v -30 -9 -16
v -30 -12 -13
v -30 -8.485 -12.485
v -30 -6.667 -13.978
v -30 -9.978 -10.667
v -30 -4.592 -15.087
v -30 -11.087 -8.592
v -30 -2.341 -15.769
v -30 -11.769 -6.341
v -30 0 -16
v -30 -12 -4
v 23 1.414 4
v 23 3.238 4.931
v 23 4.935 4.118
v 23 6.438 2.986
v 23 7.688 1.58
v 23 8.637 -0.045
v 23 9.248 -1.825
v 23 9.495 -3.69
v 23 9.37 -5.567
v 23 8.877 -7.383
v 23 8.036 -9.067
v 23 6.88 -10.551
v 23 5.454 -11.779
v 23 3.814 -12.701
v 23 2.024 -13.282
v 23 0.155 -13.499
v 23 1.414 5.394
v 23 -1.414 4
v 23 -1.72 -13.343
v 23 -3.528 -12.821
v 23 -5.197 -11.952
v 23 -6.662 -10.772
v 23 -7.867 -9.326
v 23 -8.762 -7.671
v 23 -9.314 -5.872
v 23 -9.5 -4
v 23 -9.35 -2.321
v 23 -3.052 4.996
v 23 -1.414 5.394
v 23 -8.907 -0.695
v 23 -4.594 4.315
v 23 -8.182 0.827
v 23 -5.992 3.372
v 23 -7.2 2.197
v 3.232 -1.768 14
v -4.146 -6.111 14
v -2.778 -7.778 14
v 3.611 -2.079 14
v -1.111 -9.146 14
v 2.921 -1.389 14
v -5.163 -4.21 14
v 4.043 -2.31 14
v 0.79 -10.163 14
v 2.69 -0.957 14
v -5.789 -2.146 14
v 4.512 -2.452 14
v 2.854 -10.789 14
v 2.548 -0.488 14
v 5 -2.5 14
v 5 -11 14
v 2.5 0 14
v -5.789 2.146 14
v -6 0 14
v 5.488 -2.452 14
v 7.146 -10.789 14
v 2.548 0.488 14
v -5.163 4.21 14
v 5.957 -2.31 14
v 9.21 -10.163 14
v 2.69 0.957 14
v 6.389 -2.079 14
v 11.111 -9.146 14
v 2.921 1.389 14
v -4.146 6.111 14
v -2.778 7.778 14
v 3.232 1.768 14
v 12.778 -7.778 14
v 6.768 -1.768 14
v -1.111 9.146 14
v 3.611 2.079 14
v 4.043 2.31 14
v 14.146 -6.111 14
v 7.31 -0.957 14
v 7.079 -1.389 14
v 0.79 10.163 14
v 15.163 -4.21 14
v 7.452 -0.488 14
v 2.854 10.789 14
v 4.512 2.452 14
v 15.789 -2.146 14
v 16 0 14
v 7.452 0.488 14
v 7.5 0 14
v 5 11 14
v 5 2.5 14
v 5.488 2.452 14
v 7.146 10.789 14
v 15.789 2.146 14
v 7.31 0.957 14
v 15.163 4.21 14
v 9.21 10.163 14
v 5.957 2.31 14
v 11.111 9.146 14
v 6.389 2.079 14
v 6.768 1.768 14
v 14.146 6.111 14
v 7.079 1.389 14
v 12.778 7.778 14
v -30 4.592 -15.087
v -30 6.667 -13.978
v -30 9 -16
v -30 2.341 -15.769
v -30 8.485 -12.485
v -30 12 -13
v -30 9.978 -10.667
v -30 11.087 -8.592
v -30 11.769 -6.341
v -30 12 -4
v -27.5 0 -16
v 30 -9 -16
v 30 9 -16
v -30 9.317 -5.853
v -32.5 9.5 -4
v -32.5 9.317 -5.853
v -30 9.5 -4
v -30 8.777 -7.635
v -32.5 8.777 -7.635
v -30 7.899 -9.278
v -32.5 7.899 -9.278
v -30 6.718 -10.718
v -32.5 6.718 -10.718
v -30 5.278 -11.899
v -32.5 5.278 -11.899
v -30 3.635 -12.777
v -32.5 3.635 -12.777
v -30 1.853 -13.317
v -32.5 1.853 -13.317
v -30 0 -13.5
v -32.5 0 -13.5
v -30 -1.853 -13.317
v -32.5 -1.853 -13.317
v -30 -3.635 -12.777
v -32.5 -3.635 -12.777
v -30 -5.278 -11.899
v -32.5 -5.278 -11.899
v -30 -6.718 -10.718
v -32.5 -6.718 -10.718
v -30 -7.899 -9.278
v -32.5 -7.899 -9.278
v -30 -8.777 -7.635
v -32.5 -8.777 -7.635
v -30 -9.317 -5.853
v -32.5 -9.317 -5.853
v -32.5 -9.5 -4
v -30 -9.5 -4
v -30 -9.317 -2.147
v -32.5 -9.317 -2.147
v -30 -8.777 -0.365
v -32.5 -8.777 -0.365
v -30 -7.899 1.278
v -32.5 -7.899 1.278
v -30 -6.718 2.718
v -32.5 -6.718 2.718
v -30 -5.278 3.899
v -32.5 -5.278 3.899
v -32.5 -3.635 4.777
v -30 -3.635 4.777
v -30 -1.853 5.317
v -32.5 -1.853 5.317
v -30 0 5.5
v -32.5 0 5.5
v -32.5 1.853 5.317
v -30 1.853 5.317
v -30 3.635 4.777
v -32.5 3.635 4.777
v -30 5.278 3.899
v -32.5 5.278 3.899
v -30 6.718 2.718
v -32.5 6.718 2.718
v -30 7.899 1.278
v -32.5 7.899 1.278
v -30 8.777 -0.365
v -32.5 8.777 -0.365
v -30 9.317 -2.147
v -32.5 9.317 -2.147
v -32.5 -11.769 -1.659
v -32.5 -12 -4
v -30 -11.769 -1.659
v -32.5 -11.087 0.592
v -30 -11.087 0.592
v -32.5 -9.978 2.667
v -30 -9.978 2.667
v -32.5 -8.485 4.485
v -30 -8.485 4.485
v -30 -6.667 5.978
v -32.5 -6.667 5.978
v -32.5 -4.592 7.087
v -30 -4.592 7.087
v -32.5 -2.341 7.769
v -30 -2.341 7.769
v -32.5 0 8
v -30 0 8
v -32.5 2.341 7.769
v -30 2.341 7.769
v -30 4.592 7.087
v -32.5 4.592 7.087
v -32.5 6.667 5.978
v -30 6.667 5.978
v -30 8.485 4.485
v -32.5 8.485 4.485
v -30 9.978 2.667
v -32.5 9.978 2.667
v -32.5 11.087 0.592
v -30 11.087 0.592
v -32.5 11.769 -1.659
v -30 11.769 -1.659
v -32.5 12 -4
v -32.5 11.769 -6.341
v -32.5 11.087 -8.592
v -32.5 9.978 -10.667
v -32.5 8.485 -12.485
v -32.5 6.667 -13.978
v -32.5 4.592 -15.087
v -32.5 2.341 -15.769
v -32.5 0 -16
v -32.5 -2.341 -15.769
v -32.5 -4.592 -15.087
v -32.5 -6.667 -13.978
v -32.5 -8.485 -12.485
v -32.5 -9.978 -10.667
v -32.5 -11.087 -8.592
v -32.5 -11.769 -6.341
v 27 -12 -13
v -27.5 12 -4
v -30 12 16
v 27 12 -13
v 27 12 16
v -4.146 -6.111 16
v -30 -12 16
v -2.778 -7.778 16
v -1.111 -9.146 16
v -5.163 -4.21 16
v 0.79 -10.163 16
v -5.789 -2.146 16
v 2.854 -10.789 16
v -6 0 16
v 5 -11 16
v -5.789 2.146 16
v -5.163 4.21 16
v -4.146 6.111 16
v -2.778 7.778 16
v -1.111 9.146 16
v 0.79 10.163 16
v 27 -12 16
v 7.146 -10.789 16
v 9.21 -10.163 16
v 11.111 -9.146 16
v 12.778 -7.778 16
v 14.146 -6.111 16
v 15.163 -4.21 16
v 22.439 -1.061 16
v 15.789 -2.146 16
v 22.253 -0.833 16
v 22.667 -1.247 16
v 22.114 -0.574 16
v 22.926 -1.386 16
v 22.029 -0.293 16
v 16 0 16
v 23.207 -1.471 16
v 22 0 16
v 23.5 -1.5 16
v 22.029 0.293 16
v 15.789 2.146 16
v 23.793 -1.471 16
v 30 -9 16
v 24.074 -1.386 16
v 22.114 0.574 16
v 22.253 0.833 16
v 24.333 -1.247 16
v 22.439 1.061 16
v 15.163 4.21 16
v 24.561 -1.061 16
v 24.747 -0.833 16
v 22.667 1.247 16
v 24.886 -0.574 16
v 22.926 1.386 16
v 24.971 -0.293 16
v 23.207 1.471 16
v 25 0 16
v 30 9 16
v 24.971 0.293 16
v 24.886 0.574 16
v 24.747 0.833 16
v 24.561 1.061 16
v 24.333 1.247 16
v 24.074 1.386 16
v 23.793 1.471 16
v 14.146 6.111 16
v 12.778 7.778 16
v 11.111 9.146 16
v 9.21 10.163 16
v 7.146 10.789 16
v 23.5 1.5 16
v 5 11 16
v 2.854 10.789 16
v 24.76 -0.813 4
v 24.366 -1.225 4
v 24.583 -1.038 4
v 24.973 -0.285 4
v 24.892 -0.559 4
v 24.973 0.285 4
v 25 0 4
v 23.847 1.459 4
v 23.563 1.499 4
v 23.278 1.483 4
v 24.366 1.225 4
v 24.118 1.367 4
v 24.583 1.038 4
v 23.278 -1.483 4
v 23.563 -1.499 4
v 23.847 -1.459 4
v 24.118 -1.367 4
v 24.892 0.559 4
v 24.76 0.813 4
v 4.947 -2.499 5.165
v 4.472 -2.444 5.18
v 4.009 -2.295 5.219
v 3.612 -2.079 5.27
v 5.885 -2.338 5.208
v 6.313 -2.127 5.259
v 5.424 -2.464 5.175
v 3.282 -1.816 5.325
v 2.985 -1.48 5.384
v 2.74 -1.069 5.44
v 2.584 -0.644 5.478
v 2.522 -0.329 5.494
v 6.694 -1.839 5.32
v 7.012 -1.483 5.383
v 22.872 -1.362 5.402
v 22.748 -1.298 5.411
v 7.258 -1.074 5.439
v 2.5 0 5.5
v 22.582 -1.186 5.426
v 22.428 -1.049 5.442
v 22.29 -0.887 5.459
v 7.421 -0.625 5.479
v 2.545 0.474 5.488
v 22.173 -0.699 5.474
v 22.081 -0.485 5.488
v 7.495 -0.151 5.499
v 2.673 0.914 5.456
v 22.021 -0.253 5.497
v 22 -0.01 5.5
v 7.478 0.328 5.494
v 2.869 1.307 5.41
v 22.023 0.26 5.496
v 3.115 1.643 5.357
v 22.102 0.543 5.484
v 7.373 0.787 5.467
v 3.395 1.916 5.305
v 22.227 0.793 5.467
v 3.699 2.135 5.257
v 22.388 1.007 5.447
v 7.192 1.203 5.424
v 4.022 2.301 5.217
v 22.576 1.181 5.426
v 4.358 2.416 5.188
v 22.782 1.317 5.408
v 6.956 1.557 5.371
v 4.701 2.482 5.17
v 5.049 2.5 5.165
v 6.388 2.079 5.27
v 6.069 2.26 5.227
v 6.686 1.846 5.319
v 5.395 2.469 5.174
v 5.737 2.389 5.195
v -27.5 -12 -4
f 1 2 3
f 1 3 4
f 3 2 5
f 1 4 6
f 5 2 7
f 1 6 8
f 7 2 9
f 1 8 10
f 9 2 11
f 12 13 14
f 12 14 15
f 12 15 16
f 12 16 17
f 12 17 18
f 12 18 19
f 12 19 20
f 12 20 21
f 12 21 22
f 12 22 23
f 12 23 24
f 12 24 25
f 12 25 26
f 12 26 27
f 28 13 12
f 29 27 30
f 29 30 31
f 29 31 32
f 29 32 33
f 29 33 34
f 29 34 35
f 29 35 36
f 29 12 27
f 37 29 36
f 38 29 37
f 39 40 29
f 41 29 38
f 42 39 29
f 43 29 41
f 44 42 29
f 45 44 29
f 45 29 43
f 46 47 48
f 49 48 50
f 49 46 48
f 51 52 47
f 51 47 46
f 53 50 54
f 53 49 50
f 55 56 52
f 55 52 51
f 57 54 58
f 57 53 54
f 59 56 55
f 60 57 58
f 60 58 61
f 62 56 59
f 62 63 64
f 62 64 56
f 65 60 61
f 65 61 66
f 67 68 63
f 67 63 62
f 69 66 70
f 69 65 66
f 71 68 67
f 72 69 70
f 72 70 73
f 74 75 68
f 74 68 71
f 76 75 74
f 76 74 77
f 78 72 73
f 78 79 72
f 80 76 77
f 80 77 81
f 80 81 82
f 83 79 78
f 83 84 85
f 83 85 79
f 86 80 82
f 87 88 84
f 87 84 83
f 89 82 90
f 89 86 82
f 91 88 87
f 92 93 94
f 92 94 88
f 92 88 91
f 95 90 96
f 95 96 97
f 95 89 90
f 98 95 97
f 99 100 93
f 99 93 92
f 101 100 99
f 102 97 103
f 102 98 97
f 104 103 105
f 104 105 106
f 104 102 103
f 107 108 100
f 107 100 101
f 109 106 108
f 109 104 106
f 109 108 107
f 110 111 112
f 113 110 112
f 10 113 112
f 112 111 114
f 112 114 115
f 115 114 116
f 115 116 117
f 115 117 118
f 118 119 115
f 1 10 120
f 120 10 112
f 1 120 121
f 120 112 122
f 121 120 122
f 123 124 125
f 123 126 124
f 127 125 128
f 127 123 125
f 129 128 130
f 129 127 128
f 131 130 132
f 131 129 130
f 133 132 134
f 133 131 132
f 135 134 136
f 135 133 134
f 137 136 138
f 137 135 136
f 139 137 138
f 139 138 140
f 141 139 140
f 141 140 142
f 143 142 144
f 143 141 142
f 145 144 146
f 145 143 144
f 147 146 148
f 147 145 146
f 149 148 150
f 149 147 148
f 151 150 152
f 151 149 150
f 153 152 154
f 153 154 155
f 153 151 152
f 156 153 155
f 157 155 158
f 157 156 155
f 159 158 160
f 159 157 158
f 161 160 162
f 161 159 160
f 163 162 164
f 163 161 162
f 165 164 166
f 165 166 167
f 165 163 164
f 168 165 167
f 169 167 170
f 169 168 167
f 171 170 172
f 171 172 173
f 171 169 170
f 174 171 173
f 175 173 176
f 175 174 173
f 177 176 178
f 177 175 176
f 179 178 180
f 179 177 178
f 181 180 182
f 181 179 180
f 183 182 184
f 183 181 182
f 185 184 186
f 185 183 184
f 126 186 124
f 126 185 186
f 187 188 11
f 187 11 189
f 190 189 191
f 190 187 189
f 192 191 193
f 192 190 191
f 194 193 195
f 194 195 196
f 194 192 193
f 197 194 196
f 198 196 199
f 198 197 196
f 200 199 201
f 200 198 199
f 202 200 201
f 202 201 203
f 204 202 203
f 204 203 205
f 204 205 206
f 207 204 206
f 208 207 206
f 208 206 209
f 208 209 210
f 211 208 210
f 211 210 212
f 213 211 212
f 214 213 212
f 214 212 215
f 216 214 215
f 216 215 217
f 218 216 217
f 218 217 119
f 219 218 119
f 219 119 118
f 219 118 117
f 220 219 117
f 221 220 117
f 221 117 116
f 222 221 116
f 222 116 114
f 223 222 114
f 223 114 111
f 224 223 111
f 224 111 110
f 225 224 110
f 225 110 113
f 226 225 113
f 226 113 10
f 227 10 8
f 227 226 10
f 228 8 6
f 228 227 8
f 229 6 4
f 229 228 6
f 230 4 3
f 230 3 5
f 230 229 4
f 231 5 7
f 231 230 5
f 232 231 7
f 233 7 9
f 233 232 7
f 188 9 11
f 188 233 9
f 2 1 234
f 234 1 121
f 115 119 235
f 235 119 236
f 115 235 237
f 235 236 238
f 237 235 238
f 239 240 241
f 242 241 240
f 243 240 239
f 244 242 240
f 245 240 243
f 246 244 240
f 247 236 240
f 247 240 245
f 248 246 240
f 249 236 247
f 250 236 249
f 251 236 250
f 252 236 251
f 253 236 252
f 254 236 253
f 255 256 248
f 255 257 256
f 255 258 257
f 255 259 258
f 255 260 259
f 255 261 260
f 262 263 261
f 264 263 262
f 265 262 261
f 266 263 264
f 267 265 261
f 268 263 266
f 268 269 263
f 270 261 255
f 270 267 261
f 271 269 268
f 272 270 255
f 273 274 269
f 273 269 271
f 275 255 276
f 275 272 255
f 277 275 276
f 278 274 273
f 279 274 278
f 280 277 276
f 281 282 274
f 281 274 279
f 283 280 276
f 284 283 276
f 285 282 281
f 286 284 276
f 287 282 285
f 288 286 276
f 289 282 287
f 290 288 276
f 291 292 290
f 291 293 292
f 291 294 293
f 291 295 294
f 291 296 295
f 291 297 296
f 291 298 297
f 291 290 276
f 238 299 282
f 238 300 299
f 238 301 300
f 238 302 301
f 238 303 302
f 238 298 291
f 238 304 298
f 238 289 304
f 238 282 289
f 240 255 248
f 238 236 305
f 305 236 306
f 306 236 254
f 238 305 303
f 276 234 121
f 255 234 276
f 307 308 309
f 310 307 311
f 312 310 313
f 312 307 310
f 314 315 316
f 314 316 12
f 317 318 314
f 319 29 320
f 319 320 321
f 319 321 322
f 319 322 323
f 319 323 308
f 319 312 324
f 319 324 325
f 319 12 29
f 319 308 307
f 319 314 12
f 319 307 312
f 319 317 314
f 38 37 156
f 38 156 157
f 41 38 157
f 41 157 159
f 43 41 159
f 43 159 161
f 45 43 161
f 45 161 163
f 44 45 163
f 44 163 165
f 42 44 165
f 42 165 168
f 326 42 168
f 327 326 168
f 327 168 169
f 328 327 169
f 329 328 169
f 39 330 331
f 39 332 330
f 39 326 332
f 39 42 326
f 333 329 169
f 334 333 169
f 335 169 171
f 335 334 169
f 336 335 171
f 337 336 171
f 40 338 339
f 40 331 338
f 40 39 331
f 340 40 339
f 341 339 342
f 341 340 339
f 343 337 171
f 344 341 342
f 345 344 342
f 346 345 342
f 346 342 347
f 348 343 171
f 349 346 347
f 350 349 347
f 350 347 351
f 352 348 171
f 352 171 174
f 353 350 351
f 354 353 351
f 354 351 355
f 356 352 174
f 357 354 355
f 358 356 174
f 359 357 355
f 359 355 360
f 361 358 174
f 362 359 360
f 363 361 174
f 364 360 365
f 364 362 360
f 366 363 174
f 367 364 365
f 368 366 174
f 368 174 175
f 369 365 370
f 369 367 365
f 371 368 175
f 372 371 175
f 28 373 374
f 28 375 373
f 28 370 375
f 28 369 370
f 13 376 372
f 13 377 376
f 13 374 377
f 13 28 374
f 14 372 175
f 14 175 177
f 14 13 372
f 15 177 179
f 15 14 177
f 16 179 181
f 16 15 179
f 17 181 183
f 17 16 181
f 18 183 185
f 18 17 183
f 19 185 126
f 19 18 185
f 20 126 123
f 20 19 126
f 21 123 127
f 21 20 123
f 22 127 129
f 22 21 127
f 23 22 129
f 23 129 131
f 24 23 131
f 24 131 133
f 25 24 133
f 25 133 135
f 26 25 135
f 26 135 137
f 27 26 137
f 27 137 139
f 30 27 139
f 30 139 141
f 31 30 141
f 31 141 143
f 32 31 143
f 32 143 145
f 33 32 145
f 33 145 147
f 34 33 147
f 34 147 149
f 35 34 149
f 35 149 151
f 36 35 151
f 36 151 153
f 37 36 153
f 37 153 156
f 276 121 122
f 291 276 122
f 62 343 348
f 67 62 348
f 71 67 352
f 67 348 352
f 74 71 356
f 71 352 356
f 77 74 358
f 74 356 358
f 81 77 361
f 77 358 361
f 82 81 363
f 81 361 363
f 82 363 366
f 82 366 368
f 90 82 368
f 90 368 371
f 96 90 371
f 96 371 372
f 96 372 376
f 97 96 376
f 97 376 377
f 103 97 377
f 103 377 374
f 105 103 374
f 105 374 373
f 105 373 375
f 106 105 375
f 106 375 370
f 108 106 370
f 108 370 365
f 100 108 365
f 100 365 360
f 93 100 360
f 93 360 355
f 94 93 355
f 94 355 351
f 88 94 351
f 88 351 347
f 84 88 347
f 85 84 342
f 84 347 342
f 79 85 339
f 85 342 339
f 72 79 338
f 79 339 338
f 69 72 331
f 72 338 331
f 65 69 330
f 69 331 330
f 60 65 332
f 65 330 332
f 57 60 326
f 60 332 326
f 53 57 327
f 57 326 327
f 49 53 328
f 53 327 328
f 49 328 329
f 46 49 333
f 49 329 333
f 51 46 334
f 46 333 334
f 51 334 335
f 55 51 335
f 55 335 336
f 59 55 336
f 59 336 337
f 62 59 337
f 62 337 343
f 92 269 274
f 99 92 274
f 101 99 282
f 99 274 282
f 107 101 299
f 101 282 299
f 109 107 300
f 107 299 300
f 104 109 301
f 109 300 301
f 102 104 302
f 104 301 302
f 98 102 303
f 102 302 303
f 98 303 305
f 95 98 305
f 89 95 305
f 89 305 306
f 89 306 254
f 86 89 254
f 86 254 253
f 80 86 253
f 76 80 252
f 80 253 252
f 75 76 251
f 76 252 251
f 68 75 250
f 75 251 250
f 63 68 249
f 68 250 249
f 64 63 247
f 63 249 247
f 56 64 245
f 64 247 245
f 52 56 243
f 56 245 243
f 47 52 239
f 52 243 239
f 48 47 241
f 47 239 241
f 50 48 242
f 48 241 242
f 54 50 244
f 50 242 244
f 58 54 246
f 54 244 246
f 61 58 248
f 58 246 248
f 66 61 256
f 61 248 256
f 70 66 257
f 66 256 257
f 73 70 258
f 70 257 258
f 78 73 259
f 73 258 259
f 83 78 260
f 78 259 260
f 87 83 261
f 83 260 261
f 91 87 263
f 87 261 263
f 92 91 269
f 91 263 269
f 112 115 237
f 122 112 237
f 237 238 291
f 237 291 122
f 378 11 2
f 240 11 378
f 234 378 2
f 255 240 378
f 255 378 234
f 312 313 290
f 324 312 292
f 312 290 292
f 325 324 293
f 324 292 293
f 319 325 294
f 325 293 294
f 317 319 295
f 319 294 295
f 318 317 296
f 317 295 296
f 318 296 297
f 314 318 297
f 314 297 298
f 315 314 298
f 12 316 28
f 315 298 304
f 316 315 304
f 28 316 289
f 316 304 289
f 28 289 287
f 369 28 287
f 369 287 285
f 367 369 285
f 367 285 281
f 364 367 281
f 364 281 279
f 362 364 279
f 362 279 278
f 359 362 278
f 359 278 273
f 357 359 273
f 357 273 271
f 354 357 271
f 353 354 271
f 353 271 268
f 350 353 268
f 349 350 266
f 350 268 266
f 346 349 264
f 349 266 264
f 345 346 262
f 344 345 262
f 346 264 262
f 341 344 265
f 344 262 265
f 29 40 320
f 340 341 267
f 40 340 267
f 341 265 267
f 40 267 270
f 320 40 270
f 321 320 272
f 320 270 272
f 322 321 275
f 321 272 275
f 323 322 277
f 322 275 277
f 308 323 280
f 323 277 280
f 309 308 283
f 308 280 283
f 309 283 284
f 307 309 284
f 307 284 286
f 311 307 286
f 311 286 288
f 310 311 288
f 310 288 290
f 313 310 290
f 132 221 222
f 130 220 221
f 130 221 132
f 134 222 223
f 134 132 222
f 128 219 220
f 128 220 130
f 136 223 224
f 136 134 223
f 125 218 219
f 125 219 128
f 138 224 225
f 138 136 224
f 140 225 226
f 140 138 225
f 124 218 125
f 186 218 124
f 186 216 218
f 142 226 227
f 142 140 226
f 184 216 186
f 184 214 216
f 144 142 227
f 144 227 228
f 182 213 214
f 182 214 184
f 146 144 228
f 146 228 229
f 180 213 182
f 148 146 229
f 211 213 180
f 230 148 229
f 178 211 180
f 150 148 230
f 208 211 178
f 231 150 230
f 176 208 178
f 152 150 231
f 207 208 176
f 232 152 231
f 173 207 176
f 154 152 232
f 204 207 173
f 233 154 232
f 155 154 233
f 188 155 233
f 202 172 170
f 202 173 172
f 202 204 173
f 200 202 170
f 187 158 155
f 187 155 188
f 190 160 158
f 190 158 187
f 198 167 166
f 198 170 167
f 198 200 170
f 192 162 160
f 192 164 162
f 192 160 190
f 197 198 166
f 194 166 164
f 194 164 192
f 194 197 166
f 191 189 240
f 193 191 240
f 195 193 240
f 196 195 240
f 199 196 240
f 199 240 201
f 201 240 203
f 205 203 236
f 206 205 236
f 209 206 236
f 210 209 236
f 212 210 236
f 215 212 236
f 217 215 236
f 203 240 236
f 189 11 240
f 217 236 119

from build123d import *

# Parameters (mm, degrees)
SKETCH1_W             = 60
SKETCH1_H             = 24
BOSS_EXTRUDE1_DEPTH   = 16
CHAMFER1_SIZE         = 3
SKETCH2_R             = 11
CUT_EXTRUDE1_DEPTH    = 2
SKETCH3_R             = 12
SKETCH3_R_2           = 9.5
BOSS_EXTRUDE2_DEPTH   = 2.5
CUT_EXTRUDE2_START    = -53
SKETCH4_R             = 9.5
CUT_EXTRUDE2_DEPTH    = 53
CHAMFER2_SIZE         = 3
SKETCH5_R             = 1.5
CUT_EXTRUDE3_DEPTH    = 12
M6_TAPPED_HOLE1_D     = 5
M6_TAPPED_HOLE1_DEPTH = 12
M6_TAPPED_HOLE1_TIP   = 1.502151548


with BuildPart() as part:
    # Sketch1 → Boss-Extrude1 (new, symmetric)
    with BuildSketch(Plane.XY):
        Rectangle(SKETCH1_W, SKETCH1_H)
    extrude(amount=BOSS_EXTRUDE1_DEPTH, both=True)

    # Chamfer1
    chamfer1_edges = [part.edges().sort_by_distance(p)[0] for p in [
        (30, -12, 0),
        (30, 12, 0),
    ]]
    chamfer(chamfer1_edges, length=CHAMFER1_SIZE)

    # Sketch2 → Cut-Extrude1 (cut)
    with BuildSketch(Plane.XY.offset(16)):
        with Locations((5, 0)):
            Circle(SKETCH2_R)
    extrude(amount=-CUT_EXTRUDE1_DEPTH, mode=Mode.SUBTRACT)

    # Sketch3 → Boss-Extrude2 (add, symmetric)
    with BuildSketch(Plane.ZY.offset(30)):
        with Locations(Location((-4, 0, 0), (0, 0, 270))):
            Circle(SKETCH3_R)
        with Locations(Location((-4, 0, 0), (0, 0, 90))):
            Circle(SKETCH3_R_2, mode=Mode.SUBTRACT)
    extrude(amount=BOSS_EXTRUDE2_DEPTH, both=True)

    # Sketch4 → Cut-Extrude2 (cut)
    with BuildSketch(Plane.ZY.offset(30).offset(CUT_EXTRUDE2_START)):
        with Locations(Location((-4, 0, 0), (0, 0, 270))):
            Circle(SKETCH4_R)
    extrude(amount=CUT_EXTRUDE2_DEPTH, mode=Mode.SUBTRACT)

    # Chamfer2
    chamfer2_edges = [part.edges().sort_by_distance(p)[0] for p in [
        (-1.5, -12, -16),
        (-1.5, 12, -16),
    ]]
    chamfer(chamfer2_edges, length=CHAMFER2_SIZE)

    # Sketch5 → Cut-Extrude3 (cut)
    with BuildSketch(Plane.XY.offset(16)):
        with Locations((23.5, 0)):
            Circle(SKETCH5_R)
    extrude(amount=-CUT_EXTRUDE3_DEPTH, mode=Mode.SUBTRACT)

    # M6 Tapped Hole1
    with Locations(Plane.XY.offset(14)):
        with Locations((5, 0)):
            Hole(M6_TAPPED_HOLE1_D / 2, depth=M6_TAPPED_HOLE1_DEPTH)
            with Locations((0, 0, -(M6_TAPPED_HOLE1_DEPTH + M6_TAPPED_HOLE1_TIP / 2))):  # 118° drill point
                Cone(0, M6_TAPPED_HOLE1_D / 2, M6_TAPPED_HOLE1_TIP, mode=Mode.SUBTRACT)


solid = part.part
